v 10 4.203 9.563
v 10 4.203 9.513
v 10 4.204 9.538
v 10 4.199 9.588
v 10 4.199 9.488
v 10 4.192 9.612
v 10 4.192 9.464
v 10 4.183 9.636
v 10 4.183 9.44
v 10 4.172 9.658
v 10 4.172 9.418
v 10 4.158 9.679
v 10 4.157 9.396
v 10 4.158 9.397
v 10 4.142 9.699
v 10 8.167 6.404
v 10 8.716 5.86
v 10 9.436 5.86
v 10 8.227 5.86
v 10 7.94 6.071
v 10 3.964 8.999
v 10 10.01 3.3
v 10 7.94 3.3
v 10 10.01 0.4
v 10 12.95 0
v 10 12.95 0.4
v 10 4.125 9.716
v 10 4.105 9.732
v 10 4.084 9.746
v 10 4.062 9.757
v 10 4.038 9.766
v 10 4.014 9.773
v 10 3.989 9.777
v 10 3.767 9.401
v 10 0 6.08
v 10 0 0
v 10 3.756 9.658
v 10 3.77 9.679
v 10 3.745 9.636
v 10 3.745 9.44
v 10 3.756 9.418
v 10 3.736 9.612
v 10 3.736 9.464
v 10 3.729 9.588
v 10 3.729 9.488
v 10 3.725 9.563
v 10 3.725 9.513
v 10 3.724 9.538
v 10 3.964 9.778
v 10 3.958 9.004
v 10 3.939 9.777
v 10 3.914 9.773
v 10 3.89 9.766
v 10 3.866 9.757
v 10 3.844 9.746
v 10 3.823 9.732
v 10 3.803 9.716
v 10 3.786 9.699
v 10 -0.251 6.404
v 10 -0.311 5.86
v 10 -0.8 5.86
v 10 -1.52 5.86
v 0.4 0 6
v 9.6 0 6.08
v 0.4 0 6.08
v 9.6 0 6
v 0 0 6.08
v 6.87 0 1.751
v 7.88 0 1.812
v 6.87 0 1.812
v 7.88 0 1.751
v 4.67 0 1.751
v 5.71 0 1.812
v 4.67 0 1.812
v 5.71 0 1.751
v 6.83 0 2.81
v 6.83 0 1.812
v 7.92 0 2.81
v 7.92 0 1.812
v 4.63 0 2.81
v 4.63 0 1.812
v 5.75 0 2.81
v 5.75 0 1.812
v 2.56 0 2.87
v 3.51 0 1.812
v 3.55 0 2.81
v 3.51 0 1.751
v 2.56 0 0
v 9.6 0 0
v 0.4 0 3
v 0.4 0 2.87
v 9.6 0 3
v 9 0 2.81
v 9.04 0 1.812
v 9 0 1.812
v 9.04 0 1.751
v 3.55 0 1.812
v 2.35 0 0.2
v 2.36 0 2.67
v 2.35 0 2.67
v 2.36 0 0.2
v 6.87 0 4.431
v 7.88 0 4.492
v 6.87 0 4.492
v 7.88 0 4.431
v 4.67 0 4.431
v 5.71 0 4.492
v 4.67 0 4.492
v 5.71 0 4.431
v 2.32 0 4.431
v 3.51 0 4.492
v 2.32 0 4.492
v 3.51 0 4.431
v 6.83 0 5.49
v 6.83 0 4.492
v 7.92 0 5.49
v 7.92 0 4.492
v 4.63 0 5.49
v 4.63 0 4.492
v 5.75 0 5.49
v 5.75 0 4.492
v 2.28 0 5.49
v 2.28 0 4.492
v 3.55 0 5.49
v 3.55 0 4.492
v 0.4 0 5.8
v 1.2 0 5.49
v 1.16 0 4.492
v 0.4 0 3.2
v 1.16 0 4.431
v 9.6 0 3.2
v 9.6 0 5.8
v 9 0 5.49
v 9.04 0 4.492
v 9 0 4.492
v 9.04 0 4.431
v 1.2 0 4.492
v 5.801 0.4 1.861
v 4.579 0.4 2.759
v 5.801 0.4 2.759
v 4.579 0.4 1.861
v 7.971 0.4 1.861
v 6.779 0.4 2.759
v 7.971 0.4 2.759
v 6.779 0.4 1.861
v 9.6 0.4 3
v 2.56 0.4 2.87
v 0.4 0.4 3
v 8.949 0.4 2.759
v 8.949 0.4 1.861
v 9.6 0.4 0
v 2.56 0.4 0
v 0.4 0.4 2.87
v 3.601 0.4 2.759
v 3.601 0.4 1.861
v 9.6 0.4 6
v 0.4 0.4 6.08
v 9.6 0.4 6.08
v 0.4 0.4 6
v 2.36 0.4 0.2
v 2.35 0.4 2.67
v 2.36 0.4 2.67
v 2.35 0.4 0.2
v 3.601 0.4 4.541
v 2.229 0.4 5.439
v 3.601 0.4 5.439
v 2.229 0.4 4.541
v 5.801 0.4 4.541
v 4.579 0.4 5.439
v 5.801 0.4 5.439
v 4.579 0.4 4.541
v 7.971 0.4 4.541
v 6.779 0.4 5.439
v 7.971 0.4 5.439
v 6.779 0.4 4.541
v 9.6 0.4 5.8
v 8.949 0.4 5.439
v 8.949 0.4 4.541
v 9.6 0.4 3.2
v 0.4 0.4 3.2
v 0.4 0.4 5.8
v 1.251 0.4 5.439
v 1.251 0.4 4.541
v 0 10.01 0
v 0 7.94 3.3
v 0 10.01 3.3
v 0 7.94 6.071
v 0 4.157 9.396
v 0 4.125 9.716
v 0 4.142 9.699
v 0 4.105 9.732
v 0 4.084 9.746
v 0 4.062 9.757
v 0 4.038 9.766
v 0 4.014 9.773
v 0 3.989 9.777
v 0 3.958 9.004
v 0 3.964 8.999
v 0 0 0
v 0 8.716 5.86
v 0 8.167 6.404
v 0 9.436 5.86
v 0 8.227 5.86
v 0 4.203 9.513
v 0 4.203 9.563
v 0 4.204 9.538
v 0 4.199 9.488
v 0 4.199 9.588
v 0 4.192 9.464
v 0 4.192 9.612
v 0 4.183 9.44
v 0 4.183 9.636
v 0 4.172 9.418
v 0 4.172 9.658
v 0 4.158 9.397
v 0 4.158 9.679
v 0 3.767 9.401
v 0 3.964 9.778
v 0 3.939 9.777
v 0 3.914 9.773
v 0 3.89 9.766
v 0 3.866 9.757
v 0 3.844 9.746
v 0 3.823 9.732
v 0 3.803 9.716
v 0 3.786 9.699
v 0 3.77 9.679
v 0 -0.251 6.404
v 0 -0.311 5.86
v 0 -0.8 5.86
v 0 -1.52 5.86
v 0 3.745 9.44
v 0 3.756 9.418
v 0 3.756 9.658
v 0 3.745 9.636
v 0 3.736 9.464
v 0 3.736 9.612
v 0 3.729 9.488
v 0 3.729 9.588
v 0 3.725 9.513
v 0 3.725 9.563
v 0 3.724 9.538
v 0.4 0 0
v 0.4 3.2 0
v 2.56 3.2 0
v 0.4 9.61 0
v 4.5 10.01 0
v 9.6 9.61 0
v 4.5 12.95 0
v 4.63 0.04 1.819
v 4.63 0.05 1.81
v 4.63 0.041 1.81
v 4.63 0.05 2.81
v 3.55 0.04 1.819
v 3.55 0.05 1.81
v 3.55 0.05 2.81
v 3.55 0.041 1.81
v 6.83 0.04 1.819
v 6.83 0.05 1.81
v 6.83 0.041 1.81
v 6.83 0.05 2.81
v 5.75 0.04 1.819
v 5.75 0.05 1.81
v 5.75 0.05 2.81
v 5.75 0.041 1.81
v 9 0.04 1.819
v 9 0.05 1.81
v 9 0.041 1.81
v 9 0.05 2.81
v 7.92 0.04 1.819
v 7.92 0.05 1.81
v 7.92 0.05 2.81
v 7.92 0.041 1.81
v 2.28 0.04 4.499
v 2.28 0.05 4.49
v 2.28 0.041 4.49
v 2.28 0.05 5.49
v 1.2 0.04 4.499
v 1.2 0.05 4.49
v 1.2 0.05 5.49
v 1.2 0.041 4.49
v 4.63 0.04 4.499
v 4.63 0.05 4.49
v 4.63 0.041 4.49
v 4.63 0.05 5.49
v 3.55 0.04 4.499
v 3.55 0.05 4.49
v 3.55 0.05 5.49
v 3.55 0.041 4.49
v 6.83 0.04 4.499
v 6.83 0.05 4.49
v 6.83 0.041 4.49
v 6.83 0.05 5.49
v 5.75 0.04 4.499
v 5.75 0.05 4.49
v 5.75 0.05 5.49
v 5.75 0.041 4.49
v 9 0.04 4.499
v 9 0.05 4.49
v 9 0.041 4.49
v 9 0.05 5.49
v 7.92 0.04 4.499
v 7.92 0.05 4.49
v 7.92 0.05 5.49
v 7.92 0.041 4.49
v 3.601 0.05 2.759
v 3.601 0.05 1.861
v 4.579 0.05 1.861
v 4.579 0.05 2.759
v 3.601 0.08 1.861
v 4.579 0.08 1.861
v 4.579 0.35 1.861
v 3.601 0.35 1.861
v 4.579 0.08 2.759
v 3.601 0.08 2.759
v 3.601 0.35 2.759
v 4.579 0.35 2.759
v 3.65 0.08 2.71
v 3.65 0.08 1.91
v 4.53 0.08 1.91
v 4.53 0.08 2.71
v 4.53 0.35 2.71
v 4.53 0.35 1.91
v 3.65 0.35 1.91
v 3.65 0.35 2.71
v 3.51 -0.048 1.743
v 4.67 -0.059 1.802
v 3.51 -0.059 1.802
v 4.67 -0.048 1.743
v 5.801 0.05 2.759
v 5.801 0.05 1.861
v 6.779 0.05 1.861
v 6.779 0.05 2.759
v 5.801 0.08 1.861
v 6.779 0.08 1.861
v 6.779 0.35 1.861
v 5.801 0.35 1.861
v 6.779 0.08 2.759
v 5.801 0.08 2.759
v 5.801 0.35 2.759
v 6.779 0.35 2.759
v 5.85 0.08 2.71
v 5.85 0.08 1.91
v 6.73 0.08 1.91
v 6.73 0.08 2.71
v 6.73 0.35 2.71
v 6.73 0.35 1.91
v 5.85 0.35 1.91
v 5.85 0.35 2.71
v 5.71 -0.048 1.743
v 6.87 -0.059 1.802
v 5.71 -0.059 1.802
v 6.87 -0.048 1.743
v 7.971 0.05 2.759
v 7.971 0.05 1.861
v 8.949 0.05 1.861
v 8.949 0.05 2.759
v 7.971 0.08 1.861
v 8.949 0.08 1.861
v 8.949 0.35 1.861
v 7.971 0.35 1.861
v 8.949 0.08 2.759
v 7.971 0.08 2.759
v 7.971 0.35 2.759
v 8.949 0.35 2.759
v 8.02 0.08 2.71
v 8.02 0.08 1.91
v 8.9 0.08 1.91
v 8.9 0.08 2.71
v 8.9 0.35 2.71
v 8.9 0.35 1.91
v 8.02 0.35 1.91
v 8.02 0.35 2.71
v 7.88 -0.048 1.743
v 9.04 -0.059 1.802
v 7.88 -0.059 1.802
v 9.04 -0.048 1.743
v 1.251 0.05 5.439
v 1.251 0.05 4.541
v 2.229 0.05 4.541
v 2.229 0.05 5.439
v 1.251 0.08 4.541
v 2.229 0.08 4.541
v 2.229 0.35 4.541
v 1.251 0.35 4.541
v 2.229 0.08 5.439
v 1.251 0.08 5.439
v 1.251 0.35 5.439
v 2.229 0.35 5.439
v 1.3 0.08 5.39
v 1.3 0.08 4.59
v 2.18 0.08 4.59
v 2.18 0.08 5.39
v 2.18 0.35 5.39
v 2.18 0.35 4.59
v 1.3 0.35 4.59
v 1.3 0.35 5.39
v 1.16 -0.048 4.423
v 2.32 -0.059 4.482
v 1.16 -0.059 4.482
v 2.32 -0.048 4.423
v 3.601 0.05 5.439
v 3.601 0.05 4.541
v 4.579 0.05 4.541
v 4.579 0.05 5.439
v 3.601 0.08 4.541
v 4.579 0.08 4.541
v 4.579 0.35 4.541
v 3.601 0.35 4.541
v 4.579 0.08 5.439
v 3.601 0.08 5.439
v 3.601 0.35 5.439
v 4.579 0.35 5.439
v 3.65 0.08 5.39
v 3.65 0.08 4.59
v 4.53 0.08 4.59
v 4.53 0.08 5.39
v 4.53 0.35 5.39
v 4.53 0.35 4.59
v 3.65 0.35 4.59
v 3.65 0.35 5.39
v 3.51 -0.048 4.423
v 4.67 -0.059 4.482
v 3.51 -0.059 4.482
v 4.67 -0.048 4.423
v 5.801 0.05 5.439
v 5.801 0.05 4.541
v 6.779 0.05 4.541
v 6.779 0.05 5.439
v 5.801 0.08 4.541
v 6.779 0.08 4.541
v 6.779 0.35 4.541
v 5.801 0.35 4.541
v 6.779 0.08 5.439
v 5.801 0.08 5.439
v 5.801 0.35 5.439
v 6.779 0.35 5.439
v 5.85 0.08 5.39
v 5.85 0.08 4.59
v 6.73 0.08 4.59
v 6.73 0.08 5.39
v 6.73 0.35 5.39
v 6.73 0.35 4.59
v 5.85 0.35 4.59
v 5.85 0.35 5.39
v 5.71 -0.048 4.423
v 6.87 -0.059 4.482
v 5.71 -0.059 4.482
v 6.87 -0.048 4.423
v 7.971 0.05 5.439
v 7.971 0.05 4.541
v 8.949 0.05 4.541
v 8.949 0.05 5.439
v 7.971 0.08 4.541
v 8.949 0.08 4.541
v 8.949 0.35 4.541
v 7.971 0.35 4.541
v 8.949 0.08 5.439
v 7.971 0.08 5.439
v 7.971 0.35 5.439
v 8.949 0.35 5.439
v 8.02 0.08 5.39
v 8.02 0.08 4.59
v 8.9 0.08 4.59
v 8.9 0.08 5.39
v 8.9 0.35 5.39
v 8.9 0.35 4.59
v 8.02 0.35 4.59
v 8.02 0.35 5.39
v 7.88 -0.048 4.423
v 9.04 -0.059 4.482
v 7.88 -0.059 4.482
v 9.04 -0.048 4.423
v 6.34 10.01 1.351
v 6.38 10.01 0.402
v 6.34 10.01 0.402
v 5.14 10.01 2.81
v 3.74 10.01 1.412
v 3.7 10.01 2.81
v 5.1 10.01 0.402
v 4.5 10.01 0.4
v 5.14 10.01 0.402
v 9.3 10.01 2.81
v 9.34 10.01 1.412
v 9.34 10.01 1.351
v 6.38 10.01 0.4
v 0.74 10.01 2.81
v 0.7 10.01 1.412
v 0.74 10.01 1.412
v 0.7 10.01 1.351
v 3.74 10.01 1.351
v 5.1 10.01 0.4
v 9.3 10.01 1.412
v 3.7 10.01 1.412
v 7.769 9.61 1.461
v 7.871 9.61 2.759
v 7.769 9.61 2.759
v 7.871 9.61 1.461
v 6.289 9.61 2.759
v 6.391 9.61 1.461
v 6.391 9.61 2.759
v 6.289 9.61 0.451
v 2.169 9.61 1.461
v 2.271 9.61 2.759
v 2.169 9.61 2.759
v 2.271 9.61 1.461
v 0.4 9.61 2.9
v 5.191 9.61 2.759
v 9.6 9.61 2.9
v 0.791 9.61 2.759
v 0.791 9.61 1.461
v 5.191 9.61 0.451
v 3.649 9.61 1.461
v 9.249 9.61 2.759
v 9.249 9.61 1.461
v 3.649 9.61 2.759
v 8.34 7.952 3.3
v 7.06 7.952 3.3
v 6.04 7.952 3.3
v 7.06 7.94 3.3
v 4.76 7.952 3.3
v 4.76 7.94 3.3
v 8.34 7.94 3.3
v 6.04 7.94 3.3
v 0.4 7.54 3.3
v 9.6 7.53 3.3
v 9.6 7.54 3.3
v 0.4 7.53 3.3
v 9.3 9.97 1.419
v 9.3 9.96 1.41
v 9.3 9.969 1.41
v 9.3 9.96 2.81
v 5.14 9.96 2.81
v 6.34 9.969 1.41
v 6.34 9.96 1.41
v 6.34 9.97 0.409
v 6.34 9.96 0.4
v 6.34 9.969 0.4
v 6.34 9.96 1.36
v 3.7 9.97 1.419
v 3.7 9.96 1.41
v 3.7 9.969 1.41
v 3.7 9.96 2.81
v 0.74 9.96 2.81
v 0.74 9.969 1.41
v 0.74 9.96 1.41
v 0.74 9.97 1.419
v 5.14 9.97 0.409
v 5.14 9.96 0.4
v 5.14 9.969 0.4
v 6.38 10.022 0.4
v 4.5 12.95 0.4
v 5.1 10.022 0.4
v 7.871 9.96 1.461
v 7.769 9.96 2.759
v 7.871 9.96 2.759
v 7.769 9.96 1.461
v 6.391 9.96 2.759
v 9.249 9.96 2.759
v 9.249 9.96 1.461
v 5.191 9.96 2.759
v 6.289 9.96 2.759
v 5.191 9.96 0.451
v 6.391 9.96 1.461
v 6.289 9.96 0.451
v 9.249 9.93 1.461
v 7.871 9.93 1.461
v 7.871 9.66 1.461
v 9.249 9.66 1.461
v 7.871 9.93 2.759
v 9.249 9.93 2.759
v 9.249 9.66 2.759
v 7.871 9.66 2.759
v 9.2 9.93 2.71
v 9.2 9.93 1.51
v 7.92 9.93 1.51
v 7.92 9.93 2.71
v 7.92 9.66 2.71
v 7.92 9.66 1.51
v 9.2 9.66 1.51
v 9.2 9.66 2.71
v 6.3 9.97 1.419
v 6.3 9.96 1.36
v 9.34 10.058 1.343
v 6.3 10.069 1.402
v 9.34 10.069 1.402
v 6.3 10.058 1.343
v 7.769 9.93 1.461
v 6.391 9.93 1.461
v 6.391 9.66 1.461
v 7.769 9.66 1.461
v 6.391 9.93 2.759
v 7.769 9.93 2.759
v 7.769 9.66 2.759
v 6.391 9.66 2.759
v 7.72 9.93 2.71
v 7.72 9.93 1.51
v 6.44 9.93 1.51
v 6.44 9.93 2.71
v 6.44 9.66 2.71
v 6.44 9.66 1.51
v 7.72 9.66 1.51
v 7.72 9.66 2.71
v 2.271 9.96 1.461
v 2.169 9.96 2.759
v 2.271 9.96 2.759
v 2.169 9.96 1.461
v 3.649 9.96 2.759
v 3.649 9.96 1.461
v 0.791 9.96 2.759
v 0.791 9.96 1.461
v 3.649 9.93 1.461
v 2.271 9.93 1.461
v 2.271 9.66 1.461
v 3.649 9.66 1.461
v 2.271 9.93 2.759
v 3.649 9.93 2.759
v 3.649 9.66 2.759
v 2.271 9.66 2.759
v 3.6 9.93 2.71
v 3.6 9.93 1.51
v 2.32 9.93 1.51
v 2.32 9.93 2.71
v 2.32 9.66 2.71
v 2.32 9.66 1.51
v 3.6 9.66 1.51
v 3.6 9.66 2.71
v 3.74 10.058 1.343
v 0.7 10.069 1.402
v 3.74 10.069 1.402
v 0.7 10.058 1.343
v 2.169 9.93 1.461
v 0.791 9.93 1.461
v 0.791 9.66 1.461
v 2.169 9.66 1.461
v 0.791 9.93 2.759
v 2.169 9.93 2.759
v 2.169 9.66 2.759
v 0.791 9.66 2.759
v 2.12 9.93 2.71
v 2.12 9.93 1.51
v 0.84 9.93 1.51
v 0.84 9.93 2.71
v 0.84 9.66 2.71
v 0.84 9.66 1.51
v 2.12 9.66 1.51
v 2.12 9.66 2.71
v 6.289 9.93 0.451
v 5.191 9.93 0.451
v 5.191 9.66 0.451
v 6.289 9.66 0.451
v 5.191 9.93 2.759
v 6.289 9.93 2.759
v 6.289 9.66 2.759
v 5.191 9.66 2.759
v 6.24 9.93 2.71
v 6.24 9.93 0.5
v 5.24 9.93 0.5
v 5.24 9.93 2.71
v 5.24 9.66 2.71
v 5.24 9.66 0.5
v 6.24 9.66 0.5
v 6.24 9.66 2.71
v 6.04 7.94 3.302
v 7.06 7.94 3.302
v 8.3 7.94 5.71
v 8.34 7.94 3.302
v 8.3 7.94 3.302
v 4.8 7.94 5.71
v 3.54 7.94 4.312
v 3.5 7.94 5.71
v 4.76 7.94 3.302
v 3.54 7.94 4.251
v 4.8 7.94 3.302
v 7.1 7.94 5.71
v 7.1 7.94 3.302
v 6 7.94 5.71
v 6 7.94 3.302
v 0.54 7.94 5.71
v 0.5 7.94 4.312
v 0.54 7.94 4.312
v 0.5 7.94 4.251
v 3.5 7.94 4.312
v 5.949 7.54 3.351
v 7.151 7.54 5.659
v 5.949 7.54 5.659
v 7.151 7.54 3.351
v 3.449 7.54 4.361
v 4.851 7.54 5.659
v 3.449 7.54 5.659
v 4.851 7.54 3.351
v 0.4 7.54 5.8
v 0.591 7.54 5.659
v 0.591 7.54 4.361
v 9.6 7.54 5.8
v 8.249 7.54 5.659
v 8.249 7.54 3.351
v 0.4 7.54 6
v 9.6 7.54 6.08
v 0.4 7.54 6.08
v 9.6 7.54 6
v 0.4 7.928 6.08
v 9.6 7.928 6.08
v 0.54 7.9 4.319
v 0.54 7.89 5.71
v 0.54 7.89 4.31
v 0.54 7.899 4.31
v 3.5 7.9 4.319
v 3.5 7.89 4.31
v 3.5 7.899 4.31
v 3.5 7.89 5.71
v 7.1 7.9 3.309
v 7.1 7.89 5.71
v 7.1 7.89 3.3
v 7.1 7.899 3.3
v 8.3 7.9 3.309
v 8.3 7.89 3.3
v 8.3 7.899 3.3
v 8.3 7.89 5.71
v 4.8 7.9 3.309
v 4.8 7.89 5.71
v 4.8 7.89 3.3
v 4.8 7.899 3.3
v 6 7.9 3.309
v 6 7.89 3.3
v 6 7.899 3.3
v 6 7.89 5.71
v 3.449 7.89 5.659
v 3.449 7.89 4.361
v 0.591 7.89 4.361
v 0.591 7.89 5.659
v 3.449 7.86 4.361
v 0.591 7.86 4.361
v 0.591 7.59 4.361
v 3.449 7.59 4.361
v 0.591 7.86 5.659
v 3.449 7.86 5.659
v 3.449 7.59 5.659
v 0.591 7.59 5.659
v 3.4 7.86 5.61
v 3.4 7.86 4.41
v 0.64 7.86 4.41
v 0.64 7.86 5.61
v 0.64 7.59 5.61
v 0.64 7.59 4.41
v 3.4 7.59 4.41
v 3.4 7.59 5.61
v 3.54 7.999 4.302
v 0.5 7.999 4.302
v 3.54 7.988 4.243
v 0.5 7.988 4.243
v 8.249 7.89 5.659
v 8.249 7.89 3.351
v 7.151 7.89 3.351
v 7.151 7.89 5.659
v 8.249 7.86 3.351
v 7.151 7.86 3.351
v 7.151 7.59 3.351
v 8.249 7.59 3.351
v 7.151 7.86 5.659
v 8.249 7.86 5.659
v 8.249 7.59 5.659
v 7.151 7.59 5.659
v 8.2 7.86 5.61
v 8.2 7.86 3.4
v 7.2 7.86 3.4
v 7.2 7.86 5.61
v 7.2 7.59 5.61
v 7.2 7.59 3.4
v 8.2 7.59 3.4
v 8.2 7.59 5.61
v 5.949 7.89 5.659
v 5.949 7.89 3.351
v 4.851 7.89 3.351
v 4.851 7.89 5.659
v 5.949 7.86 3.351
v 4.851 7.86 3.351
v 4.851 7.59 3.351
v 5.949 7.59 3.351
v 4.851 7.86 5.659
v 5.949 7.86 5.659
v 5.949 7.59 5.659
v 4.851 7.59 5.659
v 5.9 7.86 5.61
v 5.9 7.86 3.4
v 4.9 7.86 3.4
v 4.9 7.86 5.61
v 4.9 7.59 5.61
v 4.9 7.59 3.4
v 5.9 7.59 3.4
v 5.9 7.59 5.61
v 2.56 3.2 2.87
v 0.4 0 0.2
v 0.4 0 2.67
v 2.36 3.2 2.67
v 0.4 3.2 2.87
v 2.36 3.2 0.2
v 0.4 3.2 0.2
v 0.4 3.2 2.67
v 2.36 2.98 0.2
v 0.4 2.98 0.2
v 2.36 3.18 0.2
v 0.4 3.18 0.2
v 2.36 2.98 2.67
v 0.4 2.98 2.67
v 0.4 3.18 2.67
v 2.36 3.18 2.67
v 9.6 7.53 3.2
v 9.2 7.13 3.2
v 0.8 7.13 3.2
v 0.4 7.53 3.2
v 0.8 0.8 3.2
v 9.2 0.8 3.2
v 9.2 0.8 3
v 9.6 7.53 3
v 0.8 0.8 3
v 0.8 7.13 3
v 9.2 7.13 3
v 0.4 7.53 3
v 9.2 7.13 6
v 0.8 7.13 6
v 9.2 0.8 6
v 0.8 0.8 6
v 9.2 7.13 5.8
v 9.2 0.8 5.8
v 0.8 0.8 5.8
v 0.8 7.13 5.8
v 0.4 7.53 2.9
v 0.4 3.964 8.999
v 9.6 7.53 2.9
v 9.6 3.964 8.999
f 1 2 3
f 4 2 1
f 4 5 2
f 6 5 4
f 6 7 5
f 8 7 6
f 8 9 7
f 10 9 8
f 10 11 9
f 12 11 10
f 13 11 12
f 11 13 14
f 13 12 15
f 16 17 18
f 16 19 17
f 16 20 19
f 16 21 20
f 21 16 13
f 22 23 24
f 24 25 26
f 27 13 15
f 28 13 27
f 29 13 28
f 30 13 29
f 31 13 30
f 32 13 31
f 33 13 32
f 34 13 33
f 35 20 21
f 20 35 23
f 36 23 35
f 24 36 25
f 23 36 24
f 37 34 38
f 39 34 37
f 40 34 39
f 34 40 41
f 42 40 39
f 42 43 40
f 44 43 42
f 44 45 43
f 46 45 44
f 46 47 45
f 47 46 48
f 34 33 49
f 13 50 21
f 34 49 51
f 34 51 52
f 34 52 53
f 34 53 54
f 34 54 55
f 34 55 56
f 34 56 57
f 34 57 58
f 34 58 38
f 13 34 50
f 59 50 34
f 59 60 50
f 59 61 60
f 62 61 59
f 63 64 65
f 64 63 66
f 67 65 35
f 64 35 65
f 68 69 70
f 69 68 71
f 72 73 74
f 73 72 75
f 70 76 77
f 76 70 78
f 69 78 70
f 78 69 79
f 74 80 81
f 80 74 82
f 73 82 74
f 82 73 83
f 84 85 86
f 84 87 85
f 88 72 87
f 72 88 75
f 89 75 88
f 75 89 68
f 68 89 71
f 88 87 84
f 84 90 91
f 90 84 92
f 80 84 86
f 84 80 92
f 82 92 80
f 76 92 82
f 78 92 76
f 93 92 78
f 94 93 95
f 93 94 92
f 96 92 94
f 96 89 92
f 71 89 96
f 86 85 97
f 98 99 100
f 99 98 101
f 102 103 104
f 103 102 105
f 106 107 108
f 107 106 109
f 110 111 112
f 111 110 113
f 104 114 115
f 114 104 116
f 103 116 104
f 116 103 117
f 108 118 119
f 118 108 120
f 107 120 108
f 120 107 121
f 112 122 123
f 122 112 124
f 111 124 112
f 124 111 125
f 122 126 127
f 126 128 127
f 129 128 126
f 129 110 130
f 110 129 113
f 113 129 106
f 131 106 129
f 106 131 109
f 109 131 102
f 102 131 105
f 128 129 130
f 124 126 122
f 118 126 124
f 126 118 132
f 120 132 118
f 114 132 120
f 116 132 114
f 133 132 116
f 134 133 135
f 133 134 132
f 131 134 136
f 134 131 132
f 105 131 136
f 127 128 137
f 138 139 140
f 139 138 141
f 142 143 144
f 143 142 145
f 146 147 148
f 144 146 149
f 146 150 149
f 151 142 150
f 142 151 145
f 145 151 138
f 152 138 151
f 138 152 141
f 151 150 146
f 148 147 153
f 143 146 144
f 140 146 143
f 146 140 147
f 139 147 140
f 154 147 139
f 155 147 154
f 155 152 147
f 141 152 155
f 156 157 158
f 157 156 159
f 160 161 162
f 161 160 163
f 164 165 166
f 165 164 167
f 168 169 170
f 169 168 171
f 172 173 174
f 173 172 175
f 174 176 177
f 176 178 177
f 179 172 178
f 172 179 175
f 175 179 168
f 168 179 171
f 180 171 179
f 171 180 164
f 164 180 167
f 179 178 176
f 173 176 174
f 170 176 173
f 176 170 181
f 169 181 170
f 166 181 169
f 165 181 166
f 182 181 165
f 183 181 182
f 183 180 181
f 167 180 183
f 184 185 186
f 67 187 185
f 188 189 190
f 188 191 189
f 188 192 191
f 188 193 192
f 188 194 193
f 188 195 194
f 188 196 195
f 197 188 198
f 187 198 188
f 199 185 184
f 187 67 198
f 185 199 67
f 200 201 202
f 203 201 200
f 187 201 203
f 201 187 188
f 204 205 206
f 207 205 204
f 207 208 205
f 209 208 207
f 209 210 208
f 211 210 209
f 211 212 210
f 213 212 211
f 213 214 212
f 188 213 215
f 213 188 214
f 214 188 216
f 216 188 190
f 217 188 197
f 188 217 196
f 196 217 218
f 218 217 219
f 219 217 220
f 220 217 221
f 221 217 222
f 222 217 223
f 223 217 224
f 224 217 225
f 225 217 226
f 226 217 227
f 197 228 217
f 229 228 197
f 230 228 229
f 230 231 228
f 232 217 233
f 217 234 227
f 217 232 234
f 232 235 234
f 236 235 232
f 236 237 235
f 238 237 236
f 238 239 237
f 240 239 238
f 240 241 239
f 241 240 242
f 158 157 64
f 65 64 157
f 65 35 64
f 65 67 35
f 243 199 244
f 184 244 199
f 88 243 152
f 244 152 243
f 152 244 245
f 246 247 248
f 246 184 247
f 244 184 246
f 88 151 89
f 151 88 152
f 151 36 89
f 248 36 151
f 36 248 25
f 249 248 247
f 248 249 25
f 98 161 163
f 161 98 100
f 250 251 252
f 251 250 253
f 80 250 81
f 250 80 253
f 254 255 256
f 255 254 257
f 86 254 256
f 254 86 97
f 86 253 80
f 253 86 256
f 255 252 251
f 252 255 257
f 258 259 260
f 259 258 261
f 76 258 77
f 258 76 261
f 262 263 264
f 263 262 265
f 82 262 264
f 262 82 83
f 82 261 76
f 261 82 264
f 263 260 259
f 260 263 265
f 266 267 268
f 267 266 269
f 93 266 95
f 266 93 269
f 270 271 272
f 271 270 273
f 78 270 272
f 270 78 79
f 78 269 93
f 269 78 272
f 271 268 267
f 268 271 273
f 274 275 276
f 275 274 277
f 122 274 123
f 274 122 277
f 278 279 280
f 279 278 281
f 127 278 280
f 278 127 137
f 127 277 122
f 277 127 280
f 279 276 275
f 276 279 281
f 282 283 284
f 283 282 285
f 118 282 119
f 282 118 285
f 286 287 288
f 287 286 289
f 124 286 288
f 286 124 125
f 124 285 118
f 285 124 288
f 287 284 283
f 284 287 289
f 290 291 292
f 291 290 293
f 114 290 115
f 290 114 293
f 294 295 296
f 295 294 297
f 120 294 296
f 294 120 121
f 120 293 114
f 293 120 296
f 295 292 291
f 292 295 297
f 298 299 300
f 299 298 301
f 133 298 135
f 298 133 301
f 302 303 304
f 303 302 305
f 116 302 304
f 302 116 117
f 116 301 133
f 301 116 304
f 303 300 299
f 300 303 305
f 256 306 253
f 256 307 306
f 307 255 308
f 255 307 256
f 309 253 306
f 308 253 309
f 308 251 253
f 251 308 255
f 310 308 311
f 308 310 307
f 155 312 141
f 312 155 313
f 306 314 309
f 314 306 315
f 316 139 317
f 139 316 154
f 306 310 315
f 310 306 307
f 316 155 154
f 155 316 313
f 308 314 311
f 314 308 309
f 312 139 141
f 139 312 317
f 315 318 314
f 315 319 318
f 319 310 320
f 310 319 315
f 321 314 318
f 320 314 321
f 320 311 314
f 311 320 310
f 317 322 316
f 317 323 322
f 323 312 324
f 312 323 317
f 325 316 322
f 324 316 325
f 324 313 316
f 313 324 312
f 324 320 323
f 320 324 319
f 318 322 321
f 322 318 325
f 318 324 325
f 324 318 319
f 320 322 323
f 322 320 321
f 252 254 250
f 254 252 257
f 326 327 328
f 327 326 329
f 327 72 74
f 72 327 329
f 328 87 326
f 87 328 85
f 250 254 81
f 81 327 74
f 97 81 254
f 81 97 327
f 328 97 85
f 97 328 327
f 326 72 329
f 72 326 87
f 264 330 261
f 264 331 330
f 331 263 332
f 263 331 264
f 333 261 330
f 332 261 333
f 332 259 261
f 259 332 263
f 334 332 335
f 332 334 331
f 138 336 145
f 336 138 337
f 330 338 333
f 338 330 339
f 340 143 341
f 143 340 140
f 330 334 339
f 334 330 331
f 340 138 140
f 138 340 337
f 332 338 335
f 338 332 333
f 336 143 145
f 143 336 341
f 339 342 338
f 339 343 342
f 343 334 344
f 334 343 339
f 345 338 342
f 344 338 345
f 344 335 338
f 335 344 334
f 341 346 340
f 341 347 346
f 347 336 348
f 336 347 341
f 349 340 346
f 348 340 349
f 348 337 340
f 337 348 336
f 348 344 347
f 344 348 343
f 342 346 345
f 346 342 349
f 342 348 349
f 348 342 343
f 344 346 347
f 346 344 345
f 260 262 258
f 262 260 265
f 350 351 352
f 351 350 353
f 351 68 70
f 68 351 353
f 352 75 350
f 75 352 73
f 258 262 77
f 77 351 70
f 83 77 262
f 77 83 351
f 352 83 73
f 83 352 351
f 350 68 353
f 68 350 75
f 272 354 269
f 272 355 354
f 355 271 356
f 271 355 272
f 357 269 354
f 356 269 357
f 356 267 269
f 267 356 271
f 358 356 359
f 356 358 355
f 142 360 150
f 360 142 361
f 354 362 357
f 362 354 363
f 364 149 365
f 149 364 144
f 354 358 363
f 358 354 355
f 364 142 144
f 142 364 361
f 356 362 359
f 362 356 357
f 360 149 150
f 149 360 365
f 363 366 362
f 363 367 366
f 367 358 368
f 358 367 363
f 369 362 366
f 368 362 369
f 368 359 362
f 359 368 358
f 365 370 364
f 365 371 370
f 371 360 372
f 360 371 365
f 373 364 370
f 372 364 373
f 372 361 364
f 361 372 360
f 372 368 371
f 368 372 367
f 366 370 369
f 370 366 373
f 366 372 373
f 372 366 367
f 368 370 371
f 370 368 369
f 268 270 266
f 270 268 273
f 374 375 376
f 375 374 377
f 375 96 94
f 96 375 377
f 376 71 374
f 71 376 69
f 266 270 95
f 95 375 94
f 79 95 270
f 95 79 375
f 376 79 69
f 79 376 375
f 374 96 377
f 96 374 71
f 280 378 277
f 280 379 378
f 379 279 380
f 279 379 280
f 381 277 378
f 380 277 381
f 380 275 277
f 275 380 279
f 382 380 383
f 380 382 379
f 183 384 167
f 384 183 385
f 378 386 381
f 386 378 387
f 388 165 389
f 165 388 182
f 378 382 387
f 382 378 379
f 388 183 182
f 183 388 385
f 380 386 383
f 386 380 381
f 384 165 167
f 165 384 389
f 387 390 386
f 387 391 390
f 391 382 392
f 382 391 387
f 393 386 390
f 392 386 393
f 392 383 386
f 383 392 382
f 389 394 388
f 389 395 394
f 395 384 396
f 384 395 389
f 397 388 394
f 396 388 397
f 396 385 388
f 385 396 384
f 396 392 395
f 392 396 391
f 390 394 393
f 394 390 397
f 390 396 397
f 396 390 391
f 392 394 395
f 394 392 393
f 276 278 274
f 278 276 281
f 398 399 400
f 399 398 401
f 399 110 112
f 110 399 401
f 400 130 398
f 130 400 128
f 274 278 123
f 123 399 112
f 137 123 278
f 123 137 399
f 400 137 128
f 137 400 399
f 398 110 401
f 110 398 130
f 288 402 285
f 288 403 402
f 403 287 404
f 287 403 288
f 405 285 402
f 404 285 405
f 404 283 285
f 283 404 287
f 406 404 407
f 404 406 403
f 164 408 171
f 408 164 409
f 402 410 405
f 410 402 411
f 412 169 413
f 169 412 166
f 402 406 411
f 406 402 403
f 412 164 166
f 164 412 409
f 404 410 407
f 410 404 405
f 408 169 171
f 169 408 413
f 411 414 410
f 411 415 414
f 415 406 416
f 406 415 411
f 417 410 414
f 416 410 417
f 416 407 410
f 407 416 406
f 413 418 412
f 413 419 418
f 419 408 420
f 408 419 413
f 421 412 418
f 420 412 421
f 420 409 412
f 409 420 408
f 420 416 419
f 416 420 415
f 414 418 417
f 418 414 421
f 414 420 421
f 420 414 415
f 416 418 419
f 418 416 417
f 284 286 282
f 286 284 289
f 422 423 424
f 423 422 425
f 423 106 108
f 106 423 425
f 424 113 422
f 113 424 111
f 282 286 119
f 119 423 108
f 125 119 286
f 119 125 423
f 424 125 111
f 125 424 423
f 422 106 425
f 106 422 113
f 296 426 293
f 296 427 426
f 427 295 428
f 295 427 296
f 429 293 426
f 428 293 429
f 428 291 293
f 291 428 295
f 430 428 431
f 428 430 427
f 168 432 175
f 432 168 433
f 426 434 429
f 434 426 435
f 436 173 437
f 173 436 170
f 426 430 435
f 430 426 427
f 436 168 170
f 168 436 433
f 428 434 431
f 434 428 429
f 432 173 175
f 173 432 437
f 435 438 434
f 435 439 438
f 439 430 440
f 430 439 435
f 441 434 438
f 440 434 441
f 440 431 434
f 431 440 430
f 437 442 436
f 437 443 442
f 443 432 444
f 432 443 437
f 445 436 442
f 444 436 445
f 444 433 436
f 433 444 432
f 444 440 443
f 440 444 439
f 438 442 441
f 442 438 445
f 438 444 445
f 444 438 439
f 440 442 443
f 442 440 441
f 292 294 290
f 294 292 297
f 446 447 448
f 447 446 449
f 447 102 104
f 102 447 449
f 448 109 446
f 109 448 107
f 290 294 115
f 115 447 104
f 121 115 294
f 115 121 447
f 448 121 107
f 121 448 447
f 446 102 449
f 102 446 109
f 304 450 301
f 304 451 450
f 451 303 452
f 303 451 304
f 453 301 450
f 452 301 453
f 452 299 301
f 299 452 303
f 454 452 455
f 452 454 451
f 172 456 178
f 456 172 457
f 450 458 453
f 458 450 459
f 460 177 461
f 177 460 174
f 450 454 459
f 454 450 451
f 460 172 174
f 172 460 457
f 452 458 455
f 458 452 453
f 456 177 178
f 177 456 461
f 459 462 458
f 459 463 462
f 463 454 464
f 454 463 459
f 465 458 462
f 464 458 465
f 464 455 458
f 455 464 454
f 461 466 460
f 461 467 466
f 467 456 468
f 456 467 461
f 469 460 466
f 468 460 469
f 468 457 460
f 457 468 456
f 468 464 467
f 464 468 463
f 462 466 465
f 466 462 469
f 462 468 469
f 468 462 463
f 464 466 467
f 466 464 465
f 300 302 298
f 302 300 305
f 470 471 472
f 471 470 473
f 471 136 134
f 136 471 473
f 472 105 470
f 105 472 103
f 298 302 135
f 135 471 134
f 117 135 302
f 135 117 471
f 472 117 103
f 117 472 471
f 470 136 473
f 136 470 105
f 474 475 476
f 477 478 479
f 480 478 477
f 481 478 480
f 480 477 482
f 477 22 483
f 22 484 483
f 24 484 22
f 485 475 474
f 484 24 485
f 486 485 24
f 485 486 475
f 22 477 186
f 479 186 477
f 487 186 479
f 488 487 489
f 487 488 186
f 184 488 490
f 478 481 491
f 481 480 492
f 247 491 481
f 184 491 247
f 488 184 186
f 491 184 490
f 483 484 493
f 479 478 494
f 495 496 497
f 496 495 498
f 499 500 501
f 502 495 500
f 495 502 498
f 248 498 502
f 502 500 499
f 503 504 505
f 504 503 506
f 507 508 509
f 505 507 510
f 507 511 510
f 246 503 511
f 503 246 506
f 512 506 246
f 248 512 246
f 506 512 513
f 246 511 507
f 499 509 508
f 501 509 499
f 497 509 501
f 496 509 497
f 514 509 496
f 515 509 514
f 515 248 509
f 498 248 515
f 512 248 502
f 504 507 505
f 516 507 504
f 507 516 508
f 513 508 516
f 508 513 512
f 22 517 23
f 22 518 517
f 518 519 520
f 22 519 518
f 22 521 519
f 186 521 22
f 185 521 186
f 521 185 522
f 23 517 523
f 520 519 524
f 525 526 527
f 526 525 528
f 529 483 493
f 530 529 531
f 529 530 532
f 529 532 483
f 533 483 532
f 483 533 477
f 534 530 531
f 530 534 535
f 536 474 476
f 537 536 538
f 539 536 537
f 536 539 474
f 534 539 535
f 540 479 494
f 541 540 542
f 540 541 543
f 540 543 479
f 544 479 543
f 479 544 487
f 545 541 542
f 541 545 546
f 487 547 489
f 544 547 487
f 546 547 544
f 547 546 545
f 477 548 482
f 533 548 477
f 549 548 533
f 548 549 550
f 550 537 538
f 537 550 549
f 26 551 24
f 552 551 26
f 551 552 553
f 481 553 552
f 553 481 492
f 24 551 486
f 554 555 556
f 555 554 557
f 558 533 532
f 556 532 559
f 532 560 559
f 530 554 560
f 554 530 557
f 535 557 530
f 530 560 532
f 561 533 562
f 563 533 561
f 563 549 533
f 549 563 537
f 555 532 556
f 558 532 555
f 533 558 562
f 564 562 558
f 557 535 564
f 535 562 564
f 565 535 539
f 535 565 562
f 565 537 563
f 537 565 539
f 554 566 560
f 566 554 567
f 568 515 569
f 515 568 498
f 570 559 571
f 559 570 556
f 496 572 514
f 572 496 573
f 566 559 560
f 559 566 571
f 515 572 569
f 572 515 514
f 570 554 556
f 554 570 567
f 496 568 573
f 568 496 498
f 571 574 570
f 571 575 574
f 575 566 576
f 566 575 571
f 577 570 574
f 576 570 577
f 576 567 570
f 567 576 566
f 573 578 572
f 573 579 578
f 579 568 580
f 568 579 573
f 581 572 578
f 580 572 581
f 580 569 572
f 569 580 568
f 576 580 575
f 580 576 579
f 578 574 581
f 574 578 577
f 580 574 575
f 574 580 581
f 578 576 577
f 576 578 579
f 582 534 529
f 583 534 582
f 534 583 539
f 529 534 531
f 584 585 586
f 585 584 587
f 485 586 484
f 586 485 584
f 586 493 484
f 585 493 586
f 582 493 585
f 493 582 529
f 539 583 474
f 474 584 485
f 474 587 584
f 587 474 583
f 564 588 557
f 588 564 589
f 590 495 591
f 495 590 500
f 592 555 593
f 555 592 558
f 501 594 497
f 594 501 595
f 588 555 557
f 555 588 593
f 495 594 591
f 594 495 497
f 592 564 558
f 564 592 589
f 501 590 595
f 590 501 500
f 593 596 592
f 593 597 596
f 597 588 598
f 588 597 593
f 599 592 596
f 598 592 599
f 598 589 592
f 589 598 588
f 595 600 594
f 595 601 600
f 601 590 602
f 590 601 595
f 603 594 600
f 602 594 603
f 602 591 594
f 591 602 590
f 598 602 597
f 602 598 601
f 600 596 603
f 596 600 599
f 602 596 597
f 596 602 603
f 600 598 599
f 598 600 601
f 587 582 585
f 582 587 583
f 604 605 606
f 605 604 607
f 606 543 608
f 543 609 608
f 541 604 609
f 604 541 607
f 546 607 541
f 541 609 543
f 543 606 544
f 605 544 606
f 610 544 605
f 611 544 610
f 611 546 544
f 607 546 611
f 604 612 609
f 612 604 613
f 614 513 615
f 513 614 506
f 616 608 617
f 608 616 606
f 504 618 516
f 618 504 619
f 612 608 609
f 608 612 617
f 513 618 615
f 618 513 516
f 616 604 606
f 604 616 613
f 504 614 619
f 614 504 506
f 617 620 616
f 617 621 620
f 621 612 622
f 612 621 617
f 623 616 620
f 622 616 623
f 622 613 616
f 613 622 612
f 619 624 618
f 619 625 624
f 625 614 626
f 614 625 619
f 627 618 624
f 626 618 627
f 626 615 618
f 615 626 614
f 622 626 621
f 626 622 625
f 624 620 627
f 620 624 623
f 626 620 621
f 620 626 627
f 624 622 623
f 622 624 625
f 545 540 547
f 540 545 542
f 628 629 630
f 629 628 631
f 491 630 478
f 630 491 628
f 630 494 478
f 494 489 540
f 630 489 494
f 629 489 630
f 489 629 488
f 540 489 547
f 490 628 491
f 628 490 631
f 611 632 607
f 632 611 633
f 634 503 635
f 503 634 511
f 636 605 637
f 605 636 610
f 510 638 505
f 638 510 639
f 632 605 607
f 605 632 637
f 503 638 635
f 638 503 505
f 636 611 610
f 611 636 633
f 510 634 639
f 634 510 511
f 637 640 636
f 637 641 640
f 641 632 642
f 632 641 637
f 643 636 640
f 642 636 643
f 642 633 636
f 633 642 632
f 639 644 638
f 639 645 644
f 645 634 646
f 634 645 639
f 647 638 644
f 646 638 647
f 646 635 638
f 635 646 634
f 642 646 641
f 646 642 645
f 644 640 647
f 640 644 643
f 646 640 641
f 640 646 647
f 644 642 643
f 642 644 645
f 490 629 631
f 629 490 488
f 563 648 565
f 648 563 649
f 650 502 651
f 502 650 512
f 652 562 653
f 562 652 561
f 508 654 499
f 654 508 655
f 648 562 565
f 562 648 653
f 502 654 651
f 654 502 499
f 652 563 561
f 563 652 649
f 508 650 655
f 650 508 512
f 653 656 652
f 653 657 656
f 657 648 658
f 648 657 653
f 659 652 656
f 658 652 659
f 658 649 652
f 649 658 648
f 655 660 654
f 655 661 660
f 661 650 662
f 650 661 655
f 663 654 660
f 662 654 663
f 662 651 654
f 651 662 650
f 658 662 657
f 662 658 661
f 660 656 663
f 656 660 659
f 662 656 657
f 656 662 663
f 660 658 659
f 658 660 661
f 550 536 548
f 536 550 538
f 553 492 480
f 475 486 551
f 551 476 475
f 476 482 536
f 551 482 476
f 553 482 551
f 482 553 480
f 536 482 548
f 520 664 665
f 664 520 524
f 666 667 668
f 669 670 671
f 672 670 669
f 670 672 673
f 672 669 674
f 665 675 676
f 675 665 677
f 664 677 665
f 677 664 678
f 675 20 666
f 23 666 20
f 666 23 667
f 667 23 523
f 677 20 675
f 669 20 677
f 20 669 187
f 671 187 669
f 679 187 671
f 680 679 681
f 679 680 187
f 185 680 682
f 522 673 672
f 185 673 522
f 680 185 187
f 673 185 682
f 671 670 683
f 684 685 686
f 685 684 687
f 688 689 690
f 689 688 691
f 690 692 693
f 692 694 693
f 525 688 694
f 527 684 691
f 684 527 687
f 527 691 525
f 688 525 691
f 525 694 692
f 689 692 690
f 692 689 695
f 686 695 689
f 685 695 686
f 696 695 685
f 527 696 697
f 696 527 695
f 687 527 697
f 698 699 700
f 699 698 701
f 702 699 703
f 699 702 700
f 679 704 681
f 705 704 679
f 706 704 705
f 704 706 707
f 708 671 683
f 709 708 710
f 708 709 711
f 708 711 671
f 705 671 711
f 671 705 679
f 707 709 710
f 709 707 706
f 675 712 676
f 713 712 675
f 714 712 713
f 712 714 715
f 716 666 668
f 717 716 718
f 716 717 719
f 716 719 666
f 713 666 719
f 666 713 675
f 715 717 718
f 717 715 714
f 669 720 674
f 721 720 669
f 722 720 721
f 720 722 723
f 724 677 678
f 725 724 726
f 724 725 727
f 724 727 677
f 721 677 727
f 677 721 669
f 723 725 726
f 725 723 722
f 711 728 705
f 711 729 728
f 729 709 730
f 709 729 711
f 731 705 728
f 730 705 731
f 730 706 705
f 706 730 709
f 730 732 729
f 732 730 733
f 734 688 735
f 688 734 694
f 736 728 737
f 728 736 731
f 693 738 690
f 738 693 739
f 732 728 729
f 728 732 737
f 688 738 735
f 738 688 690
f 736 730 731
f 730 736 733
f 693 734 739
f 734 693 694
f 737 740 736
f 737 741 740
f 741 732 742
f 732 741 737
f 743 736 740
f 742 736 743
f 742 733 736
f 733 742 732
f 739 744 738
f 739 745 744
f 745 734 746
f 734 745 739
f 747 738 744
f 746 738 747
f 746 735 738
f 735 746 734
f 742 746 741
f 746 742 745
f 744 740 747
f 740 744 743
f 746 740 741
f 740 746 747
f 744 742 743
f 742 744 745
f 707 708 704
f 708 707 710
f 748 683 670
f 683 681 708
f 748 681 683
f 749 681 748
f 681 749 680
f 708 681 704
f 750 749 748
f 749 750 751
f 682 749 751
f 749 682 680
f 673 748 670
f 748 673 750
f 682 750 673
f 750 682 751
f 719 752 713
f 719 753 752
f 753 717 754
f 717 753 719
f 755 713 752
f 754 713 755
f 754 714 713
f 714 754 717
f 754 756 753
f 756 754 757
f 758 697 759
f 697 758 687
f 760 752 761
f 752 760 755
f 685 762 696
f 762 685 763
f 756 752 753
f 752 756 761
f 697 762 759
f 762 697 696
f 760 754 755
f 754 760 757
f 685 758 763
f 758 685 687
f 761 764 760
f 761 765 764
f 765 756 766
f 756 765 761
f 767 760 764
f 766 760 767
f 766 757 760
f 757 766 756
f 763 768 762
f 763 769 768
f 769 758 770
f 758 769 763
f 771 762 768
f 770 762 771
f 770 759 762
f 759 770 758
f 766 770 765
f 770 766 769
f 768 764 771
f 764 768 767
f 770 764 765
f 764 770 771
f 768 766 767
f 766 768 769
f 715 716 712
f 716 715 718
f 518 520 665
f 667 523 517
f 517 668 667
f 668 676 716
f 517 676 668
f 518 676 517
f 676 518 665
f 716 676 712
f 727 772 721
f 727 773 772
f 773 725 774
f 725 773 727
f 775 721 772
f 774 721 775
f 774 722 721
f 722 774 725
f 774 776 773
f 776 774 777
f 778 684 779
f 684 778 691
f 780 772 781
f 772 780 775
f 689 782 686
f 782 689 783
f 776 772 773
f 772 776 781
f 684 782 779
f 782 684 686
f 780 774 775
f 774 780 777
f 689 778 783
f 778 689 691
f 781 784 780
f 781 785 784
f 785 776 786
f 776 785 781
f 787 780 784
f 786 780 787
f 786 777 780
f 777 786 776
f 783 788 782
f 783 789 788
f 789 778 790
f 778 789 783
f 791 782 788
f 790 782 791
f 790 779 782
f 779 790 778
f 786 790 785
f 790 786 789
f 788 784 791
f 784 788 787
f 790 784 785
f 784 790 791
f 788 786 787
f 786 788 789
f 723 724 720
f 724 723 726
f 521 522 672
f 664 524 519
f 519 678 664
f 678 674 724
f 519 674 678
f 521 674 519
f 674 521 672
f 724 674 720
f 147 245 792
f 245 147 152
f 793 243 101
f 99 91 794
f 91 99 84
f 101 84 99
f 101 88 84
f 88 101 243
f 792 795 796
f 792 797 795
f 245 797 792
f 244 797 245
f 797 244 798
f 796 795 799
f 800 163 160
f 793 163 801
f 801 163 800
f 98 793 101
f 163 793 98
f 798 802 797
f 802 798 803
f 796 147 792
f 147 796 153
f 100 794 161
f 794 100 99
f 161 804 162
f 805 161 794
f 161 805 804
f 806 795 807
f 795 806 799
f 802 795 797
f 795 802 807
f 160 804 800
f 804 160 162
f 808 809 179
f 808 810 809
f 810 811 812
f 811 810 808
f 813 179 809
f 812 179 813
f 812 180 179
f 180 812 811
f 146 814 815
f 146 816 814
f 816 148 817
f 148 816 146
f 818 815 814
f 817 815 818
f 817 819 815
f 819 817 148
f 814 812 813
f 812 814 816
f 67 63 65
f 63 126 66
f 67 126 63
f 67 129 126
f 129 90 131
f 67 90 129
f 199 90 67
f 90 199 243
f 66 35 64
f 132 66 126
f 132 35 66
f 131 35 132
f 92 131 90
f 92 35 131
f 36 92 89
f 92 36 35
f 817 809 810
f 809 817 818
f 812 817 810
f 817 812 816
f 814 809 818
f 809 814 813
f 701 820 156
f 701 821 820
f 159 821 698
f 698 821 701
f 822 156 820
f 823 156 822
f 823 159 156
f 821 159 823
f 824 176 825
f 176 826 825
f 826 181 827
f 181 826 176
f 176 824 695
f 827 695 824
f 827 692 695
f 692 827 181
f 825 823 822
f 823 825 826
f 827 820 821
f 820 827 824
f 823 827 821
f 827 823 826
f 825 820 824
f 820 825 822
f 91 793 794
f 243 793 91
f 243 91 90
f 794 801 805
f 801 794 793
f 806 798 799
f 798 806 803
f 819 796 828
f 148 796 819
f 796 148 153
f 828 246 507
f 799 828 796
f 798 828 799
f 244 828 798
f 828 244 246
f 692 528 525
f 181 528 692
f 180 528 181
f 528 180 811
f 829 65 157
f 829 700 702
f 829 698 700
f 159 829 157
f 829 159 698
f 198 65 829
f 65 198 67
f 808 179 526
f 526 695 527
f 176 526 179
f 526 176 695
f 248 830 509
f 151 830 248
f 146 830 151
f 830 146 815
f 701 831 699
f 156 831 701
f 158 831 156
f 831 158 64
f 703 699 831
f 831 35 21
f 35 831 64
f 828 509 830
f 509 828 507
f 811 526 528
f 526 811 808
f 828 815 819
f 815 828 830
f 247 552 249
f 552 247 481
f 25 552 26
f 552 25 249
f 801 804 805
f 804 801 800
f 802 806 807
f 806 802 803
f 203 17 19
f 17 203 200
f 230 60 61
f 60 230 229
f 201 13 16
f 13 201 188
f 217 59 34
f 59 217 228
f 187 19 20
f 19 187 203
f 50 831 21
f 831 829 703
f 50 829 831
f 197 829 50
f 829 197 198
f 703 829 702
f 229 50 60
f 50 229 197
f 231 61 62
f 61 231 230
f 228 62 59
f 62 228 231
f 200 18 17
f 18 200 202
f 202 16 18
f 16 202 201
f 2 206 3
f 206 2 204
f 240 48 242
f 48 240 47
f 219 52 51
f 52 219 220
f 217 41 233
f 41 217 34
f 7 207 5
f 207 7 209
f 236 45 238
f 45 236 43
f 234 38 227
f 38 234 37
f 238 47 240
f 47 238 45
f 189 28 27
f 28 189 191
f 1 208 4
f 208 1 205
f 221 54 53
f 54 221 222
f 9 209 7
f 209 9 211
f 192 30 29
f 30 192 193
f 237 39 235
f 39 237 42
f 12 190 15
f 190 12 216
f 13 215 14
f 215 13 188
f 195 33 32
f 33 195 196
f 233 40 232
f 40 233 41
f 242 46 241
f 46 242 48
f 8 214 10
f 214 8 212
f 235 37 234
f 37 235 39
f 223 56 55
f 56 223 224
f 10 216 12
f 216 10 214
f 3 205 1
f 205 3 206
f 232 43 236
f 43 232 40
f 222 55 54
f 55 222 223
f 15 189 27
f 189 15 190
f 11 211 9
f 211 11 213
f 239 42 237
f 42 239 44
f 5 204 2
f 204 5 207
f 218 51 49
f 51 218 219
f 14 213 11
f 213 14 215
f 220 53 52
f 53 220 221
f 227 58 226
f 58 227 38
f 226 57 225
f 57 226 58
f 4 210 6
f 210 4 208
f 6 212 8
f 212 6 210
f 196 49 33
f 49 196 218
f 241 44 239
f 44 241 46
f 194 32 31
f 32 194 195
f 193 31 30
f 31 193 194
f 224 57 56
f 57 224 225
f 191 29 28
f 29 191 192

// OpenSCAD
m=1000/1000;
c=m/100;
thickness=0.4*m;
sidewalllength=10*m; // wall length
frontwalllength=10*m;

module frame (size) { 
  x=size[0];y=size[1];w=size[2];t=size[3];
  // xsize, ysize, width, thickness 
  union() {
    cube([x,w,t]);
    translate ([0,y-w,0]) cube([x,w,t]);
    cube([w,y,t]);
    translate ([x-w,0,0]) cube([w,y,t]);
  }
}
  
       
module window (size) {
  x=size[0];y=size[1];w=size[2];
  fsize=[x+0.2*c,y+0.2*c,5.2*c,w-5*c];
  union () {
    translate([-0.1*c,-0.1*c,0]) frame(fsize);
    translate([5*c,5*c,5*c]) frame([x-10*c,y-10*c,5*c,w-13*c]);
    translate([-0.04*m,-0.05*m,w-0.05*m]) 
      rotate([10,0,0]) cube([x+2*0.04*m,0.06*m,0.1*m]);
  }
}

module windowhole (size) {
  translate ([0,0,-0.05*m]) cube(size+[0,0,0.1*m]);
}

// frame ( [1*m,0.5*m,0.1*m,0.05*m]);
module frontwall () {
wsize=[1.08*m,1*m,thickness];
wpos1=[3.55*m,1.81*m,0];
wpos2=[5.75*m,1.81*m,0];
wpos3=[7.92*m,1.81*m,0];
wpos4=[1.2*m,4.49*m,0];
wpos5=[3.55*m,4.49*m,0];
wpos6=[5.75*m,4.49*m,0];
wpos7=[7.92*m,4.49*m,0];
union() {
  difference() {
    cube([frontwalllength,6.08*m,thickness]);
    //translate([-1.9*thickness,-1*c,0]) rotate([0,45,0]) cube([2*thickness,7*m,2*thickness]);
    //translate([10*m-0.9*thickness,-1*c,0]) rotate([0,45,0]) cube([2*thickness,7*m,2*thickness]);
    translate([-1*c,-1*c,-0.05*m]) cube([2.36*m,2.87*m,thickness+10*c]);
    translate(wpos1) windowhole(wsize);
    translate(wpos2) windowhole(wsize);
    translate(wpos3) windowhole(wsize);
    translate(wpos4) windowhole(wsize);
    translate(wpos5) windowhole(wsize);
    translate(wpos6) windowhole(wsize);
    translate(wpos7) windowhole(wsize);
  }
  translate(wpos1) window(wsize);
  translate(wpos2) window(wsize);
  translate(wpos3) window(wsize);
  translate(wpos4) window(wsize);
  translate(wpos5) window(wsize);
  translate(wpos6) window(wsize);
  translate(wpos7) window(wsize);
}
}

module sidewall () {
  wl = sidewalllength;
  linear_extrude (height=thickness) 
    polygon(points=[[0,0],[10*m,0],
		    [10*m,3.3*m],[wl-2.07*m,3.3*m],[wl-2.07*m,6.08*m],
		    [(wl-2.07*m)/2,wl-1*m],[0,6.08*m]]);
  //cube([10*m,6.08*m,thickness]);
}

module backwalllower () {
  wsize=[1.48*m,1.4*m,thickness];
  wpos1=[0.7*m,1.41*m,0];
  wpos2=[0.7*m+1.48*m,1.41*m,0];
  wpos3=[6.3*m,1.41*m,0];
  wpos4=[6.3*m+1.48*m,1.41*m,0];
  dpos=[0.7*m+2*1.48*m,40*c,0];
  dsize=[1.2*m,(1.4+1.01)*m,thickness];
  union () {
    difference() {
      cube([10*m,3.3*m,thickness]);
      translate(wpos1) windowhole(wsize);
      translate(wpos2) windowhole(wsize);
      translate(wpos3) windowhole(wsize);
      translate(wpos4) windowhole(wsize);
      translate(dpos) windowhole(dsize);
    }
    translate(wpos1) window(wsize);
    translate(wpos2) window(wsize);
    translate(wpos3) window(wsize);
    translate(wpos4) window(wsize);
    translate(dpos) window(dsize);
  }
}

module balconyfloor() {
  cube([10*m,2.07*m+thickness,thickness]);
}

module backwallupper () {
  wsize=[2*1.48*m,1.4*m,thickness];
  wpos=[6.5*m,1.41*m,0];
  dpos1=[1.7*m,40*c,0];
  dpos2=[4*m,40*c,0];
  dsize=[1.2*m,(1.4+1.01)*m,thickness];
  union () {
    difference() {
      cube([10*m,(6.08-3.3)*m+thickness,thickness]);
      translate(wpos) windowhole(wsize);
      translate(dpos1) windowhole(dsize);
      translate(dpos2) windowhole(dsize);
    }
    translate(wpos) window(wsize);
    translate(dpos1) window(dsize);
    translate(dpos2) window(dsize);
  }
}

module house_without_roof() {
translate ([0,thickness,0]) rotate ([90,0,0]) frontwall();
translate ([0,0,0]) rotate([90,0,90]) sidewall();
translate ([10*m-thickness,0,0]) rotate([90,0,90]) sidewall();
translate ([10*m,sidewalllength-thickness+1*c,0]) rotate ([90,0,180]) backwalllower();
translate ([0,sidewalllength-2.07*m-thickness,3.3*m-thickness]) balconyfloor();
translate ([10*m,sidewalllength-2.07*m-thickness+1*c,2.9*m]) rotate ([90,0,180]) backwallupper();
// terrase
translate([10*m-5.5*m,sidewalllength-5*c,0]) cube([5.5*m,3*m,0.4*m]); 
// garage
translate([0,3.2*m,0]) rotate([90,0,0]) 
  frame([2.36*m+thickness/2,2.87*m,thickness/2,3.2*m]);
translate([0,3.18*m,0]) rotate([90,0,0]) cube([2.36*m+thickness/2,2.87*m,thickness/2])
// to stabalize the contraction
frame([10*m,sidewalllength,2*thickness,thickness/2]);
translate([0,0,3*m]) 
  frame([10*m,sidewalllength-2.07*m,2*thickness,thickness/2]);
translate([0,0,5.8*m]) 
  frame([10*m,sidewalllength-2.07*m,2*thickness,thickness/2]);
}

module roof() {
  wl = sidewalllength; //-2.07*m 
  sf = 1.2; 
  difference () {
    scale([1,sf,sf]) translate ([0,0,thickness]) rotate([90,0,90]) 
      linear_extrude (height=frontwalllength) 
      polygon(points=[[-15*c,0],[wl-2.07*m+15*c,0*m],[(wl-2.07*m)/2,wl-(1+6.08)*m+15*c]]);
    scale([1,sf,sf]) translate ([-15*c,0,10*c]) rotate([90,0,90]) 
      //	  linear_extrude (height=thickness+30*c) 
      linear_extrude (height=frontwalllength+30*c) 
      polygon(points=[[0,0],[wl-2.07*m,0*m],[(wl-2.07*m)/2,wl-(1+6.08)*m]]);
    /*
      scale([1,sf,sf]) translate ([frontwalllength-15*c-thickness,0,0]) rotate([90,0,90]) 
      linear_extrude (height=thickness+30*c) 
      polygon(points=[[0,0],[wl-2.07*m,0*m],[(wl-2.07*m)/2,wl-(1+6.08)*m]]);
    */
  }
  //translate([2*thickness+15*c,2*thickness+15*c,0]) cube([frontwalllength-4*thickness-30*c,wl-2.07*m-30*c-4*thickness,thickness+5*c]);

  scale([1,sf,sf]) translate ([0,0,0]) rotate([90,0,90]) 
    linear_extrude (height=frontwalllength) 
    //	polygon(points=[[0,0],[0,thickness],[2*thickness,3*thickness-10*c],[-2*thickness,0]]);
    polygon(points=[[0,thickness],[0,thickness],[2*thickness,3*thickness-20*c],[-1.5*thickness,thickness]]);
  scale([1,sf,sf]) translate ([frontwalllength,sidewalllength-2.07*m,0]) rotate([90,0,-90]) 
    linear_extrude (height=frontwalllength) 
    //	polygon(points=[[0,0],[0,thickness],[2*thickness,3*thickness-10*c],[-2*thickness,0]]);
    polygon(points=[[0,thickness],[0,thickness],[2*thickness,3*thickness-20*c],[-1.5*thickness,thickness]]);

  scale([1,sf,sf]) translate([0,wl-(6.08)*m+5*c,(wl-2.07*m-100*c)/2]) rotate ([90,0,90]) 
    linear_extrude (height=frontwalllength) circle(r=thickness/2, $fn=60);
  /*
    for (i=[1:10]) {
    scale([1,sf,sf]) translate ([i*5,0,thickness]) rotate([90,0,90]) 
    linear_extrude (height=0.5) 
    polygon(points=[[-15*c,0],[wl-2.07*m+15*c,0*m],[(wl-2.07*m)/2,wl-(1+6.08)*m+15*c]]);
    }*/
}

/*
module roof () {
    roof1();
}
*/

house_without_roof();
translate([0,-80*c,6.08*m-70*c]) 
//translate([0,0,-50*c]) 
roof();
